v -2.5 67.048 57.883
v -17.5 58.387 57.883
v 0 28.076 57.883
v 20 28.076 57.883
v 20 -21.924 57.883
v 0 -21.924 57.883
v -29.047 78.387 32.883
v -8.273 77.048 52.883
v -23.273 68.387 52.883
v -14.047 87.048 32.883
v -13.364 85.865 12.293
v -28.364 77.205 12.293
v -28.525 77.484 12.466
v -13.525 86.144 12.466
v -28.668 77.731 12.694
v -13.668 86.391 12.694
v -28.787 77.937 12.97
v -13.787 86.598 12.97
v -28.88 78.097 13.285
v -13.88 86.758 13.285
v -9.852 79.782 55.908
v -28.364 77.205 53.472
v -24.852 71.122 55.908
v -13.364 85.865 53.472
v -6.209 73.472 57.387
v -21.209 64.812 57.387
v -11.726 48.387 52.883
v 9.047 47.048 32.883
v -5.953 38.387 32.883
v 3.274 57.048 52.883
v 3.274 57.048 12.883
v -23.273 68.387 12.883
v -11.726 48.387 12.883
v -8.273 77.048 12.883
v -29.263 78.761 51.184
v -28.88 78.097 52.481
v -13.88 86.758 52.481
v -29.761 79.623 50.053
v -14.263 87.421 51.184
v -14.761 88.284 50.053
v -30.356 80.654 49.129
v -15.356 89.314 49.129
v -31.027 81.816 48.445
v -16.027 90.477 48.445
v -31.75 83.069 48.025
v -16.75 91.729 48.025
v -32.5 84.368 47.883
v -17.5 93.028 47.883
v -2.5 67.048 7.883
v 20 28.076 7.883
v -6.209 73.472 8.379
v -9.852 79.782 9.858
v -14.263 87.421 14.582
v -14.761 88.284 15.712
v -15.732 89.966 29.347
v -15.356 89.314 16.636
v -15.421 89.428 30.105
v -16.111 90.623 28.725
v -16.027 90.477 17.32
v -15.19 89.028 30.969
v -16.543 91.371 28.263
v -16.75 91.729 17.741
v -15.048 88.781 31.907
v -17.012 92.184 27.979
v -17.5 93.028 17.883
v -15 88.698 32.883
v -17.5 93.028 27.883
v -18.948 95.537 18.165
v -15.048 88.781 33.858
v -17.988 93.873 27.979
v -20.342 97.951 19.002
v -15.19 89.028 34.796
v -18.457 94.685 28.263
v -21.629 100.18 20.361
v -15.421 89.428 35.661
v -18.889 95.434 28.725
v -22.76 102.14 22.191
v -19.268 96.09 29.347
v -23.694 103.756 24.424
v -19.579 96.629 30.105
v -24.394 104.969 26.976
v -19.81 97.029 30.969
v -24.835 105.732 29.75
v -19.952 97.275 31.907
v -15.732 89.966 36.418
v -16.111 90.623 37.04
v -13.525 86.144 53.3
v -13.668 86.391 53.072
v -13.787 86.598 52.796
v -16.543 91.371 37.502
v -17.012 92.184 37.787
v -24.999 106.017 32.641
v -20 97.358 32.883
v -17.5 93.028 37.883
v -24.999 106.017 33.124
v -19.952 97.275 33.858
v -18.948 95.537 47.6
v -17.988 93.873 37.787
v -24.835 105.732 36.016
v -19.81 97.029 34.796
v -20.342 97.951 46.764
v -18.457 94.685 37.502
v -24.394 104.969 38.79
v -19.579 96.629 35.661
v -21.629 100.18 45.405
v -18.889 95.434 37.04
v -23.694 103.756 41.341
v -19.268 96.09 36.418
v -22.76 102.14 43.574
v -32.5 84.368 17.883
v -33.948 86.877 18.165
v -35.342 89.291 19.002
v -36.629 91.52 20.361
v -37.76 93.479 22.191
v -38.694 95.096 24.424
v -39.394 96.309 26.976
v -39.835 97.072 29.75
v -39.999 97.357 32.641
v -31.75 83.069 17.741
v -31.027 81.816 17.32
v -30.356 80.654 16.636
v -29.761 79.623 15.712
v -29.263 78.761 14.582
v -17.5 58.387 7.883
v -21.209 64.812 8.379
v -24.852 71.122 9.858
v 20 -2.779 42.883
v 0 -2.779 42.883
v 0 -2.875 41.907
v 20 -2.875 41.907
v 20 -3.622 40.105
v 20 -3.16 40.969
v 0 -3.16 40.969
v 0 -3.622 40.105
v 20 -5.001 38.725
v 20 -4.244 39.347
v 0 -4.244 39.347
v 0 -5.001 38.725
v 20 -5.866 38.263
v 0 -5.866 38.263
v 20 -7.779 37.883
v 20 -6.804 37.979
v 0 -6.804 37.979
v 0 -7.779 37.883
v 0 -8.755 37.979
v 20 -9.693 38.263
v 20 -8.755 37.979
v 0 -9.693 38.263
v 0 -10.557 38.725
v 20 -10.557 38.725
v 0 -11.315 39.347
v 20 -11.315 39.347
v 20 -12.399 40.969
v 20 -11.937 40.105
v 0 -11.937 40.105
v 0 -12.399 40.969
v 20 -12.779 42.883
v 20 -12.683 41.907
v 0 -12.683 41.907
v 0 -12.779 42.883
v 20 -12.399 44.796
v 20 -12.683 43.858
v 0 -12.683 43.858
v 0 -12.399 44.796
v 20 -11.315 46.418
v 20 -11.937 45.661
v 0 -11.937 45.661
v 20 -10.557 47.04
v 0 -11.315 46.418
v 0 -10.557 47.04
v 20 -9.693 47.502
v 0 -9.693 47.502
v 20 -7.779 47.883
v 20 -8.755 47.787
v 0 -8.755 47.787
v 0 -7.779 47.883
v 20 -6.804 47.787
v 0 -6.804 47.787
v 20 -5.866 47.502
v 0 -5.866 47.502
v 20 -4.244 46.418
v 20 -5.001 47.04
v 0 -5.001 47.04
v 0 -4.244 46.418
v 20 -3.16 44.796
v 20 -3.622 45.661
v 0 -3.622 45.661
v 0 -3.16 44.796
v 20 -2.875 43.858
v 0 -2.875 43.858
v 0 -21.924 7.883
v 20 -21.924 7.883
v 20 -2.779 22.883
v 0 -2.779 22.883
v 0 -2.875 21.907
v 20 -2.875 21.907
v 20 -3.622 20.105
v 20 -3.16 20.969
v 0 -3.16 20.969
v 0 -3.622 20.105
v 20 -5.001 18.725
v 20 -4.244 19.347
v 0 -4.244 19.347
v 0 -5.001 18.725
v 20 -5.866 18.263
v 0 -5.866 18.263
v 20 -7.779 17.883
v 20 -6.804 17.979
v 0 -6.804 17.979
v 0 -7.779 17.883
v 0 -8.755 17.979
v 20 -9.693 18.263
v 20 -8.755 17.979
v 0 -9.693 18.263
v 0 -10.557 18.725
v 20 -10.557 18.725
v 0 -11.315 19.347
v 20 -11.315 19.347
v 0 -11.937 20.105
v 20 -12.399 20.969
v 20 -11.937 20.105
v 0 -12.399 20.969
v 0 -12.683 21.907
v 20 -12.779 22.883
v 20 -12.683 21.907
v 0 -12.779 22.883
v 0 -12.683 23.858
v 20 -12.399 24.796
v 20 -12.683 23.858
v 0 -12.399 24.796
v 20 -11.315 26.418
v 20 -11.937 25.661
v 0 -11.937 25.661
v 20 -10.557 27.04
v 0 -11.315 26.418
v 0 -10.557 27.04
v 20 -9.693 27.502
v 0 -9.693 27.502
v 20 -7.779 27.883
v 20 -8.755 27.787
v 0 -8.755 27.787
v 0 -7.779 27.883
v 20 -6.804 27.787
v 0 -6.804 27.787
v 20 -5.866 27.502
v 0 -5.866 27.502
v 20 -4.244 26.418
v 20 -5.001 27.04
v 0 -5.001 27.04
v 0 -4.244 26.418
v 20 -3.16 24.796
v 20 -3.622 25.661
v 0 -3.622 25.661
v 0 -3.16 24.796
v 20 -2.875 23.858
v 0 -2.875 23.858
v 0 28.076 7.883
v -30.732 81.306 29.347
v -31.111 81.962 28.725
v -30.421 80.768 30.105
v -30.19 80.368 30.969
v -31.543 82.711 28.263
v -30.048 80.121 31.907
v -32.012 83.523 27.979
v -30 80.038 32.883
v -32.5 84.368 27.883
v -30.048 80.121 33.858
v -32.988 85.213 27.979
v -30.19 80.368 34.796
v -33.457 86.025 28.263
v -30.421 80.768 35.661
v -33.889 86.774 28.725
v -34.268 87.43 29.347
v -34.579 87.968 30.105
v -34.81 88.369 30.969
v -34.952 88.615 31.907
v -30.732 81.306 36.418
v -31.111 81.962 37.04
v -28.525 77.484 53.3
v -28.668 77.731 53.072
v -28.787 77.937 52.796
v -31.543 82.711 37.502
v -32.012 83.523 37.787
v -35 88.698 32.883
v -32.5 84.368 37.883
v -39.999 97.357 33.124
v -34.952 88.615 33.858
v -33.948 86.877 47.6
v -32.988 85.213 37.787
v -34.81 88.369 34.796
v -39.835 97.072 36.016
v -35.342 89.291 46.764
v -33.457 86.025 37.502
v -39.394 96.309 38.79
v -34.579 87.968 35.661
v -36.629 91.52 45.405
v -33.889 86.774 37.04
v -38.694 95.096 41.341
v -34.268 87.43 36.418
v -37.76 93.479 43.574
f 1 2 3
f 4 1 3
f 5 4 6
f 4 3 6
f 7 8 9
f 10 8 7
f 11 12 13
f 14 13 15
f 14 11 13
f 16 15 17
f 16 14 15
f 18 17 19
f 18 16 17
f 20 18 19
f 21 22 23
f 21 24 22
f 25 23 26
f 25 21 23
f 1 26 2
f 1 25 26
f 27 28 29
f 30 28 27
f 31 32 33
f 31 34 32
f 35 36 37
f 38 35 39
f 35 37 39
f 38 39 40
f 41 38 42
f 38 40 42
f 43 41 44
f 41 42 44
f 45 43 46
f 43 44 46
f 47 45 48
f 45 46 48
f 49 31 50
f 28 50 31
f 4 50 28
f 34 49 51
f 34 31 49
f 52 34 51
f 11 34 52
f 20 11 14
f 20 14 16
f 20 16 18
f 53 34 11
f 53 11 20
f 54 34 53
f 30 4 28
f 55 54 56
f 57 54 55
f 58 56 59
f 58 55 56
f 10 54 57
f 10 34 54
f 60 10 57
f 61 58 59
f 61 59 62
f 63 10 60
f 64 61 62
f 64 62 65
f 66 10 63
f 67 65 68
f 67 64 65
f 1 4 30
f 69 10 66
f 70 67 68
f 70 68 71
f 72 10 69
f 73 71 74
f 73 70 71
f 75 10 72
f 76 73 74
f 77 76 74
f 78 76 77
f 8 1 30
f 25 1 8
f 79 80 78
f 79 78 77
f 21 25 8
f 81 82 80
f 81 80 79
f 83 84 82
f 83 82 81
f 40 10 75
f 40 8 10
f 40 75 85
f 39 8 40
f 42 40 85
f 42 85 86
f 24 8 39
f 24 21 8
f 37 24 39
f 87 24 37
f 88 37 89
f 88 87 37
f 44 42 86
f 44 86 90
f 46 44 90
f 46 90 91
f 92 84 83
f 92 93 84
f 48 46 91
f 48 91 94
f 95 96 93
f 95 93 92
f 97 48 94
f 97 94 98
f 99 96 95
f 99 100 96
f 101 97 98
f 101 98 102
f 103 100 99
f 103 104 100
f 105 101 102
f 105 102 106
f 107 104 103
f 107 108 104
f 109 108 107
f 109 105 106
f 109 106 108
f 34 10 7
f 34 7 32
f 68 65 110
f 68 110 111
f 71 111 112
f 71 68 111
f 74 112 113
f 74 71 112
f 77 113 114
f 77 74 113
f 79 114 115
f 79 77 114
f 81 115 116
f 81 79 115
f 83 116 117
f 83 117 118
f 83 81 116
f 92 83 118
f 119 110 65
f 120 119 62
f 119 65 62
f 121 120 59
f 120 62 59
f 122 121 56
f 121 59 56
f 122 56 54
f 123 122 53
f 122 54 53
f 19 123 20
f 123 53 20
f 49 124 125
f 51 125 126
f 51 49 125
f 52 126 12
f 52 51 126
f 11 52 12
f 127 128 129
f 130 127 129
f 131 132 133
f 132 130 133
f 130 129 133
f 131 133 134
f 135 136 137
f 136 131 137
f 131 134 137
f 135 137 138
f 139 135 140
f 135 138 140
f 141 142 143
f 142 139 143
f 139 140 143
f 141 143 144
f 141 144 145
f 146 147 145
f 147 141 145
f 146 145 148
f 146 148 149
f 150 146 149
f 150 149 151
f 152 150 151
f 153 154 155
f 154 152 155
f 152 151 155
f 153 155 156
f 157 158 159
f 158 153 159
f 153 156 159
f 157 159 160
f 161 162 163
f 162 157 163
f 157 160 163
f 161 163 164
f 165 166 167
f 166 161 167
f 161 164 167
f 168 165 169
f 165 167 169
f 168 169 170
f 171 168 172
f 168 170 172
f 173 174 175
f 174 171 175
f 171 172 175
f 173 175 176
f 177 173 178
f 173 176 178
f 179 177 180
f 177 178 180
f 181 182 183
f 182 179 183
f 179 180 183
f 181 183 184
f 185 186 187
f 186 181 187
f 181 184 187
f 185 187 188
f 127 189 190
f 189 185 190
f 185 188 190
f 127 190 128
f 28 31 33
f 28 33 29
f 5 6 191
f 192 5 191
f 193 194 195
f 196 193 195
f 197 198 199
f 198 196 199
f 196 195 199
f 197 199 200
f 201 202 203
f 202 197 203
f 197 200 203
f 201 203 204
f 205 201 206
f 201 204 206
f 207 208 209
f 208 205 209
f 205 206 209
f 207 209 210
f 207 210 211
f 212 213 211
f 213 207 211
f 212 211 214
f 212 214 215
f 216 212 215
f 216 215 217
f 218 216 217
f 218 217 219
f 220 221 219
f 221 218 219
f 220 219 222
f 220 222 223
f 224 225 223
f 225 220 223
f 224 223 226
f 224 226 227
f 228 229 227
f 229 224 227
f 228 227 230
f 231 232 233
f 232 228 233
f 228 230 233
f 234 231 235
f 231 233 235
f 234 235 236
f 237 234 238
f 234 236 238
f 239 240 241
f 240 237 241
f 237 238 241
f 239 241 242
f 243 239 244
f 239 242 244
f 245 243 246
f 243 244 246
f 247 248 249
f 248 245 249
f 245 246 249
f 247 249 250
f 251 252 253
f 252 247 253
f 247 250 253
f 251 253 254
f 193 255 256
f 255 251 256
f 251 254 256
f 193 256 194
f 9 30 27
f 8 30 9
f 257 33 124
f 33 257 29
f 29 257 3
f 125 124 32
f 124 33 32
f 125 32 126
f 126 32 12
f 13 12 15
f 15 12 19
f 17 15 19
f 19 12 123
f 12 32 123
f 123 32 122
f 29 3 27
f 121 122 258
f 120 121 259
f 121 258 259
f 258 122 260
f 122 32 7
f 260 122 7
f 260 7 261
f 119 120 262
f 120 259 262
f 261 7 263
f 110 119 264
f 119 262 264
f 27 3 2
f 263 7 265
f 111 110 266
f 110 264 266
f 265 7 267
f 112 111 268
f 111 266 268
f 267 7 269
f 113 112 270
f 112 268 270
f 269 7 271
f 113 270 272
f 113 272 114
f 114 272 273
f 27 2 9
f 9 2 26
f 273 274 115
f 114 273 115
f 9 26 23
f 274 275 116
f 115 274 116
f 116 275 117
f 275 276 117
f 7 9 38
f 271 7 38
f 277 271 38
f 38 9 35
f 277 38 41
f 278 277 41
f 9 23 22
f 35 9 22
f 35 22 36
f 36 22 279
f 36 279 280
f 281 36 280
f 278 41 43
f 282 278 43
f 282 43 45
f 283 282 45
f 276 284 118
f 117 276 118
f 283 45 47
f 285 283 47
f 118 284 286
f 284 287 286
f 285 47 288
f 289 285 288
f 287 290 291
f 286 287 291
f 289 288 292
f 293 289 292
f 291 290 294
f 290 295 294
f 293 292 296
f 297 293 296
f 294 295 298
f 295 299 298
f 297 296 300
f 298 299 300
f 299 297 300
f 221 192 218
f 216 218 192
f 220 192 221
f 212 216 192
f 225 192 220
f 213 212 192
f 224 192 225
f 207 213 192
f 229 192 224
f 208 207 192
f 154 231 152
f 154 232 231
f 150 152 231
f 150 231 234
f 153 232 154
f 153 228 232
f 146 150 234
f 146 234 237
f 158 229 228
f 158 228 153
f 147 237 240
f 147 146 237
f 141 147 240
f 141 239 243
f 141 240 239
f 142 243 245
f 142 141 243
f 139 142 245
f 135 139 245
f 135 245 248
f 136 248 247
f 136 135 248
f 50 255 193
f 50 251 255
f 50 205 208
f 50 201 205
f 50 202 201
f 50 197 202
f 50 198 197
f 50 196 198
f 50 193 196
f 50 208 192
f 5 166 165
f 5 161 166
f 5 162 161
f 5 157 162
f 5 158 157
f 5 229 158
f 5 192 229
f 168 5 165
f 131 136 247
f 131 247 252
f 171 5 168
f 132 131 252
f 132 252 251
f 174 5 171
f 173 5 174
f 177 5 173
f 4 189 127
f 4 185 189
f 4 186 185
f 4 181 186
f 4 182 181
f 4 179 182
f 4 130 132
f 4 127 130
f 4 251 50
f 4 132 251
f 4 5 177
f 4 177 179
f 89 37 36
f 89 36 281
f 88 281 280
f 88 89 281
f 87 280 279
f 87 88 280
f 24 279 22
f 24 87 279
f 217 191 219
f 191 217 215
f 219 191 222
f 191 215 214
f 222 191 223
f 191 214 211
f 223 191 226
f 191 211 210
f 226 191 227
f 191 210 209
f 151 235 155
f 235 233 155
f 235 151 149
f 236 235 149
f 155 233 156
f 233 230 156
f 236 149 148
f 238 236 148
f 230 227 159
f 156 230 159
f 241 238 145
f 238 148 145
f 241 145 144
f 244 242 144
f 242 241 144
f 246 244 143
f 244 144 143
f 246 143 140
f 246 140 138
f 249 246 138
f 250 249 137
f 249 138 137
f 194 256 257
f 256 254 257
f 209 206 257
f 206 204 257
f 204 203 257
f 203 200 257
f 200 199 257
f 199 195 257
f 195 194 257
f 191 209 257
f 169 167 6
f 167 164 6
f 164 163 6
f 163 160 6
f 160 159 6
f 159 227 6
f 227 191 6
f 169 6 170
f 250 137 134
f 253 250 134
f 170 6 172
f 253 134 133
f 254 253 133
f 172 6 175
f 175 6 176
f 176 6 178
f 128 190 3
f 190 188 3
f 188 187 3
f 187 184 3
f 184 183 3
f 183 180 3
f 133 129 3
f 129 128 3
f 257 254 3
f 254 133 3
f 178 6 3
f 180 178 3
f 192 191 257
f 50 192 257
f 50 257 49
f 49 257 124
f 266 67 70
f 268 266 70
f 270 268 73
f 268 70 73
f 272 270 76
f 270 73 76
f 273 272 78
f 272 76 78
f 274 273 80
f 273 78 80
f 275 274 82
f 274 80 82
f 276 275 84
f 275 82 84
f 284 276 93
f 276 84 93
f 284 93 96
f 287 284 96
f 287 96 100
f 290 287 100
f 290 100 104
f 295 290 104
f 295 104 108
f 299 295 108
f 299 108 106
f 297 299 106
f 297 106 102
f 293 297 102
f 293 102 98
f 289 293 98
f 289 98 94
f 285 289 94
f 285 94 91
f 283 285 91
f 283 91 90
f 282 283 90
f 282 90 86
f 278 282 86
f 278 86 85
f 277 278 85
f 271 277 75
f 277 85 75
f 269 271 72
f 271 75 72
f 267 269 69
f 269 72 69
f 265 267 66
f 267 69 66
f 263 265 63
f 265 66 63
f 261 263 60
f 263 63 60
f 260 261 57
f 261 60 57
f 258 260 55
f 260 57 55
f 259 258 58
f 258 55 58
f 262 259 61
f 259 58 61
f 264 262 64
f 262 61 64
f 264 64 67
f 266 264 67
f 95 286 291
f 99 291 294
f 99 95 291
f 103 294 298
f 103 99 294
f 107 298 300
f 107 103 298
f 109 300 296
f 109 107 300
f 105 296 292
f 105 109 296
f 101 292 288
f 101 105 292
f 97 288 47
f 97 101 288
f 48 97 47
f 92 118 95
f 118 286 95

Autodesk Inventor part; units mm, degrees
ref_plane "YZ Plane" through (0, 0, 0) normal (1, 0, 0) x (0, 1, 0)
ref_plane "XZ Plane" through (0, 0, 0) normal (0, 1, 0) x (-1, 0, 0)
ref_plane "XY Plane" through (0, 0, 0) normal (0, 0, 1) x (1, 0, 0)
sketch "Sketch1" plane through (0, 0, 0) normal (1, 0, 0) x (0, 1, 0)
  line L0 (28.0764, 57.8828) -> (-21.9236, 57.8828)
  line L1 (-21.9236, 57.8828) -> (-21.9236, 7.8828)
  line L2 (-21.9236, 7.8828) -> (28.0764, 7.8828)
  line L3 (28.0764, 7.8828) -> (28.0764, 57.8828)
  circle A0 centre (-7.7792, 22.8828) radius 5
  circle A1 centre (-7.7792, 42.8828) radius 5
  point P0 (0, 0)
  dimension "d0" = 50
  dimension "d1" = 50
  dimension "d3" = 10
  dimension "d5" = 10
extrude "Extrusion1" add sketch "Sketch1" along normal blind 20
sketch "Sketch2" plane through (0, -21.9236, 57.8828) normal (0, 0, 1) x (1, 0, 0)
  line L0 (20, 0) -> (20, 50) projected
  line L1 (20, 50) -> (-25, 127.9423)
  line L2 (20, 50) -> (110, 50) construction
  line L3 (0, 50) -> (-45, 127.9423)
  line L4 (0, 50) -> (90, 50) construction
  line L5 (-45, 127.9423) -> (-25, 127.9423)
  line L6 (0, 50) -> (20, 50)
  point P0 (0, 21.9236)
  dimension "d8" = 90
  dimension "d9" = 120
  dimension "d10" = 90
  dimension "d11" = 120
extrude "Extrusion2" add sketch "Sketch2" against normal blind 50
sketch "Sketch3" plane through (20, 28.0764, 57.8828) normal (0.866, 0.5, 0) x (0, 0, -1)
  line L0 (0, 0) -> (0, -43.3013) projected
  line L1 (0, 0) -> (0, 90) projected
  arc A0 (40, 75) -> (10, 75) centre (25, 75) ccw
  line L2 (0, 0) -> (0, 45)
  line L3 (50, 0) -> (0, 0) projected
  line L4 (0, 0) -> (50, 0)
  line L5 (50, 0) -> (50, 45)
  arc A1 (5.4018, 67.7593) -> (10, 75) centre (2, 75) ccw
  line L6 (10, 75) -> (2, 75) construction
  line L7 (4.7362, 67.4825) -> (2, 75) construction
  arc A2 (40, 75) -> (44.5982, 67.7593) centre (48, 75) ccw
  line L8 (40, 75) -> (48, 75) construction
  line L9 (45.2638, 67.4825) -> (48, 75) construction
  arc A3 (4.4105, 66.7289) -> (0, 45) centre (55.73, 45) ccw
  arc A4 (50, 45) -> (45.5895, 66.7289) centre (-5.73, 45) ccw
  arc A5 (5.4018, 67.7593) -> (4.4105, 66.7289) centre (6.2523, 65.9491) ccw
  arc A6 (45.5895, 66.7289) -> (44.5982, 67.7593) centre (43.7477, 65.9491) ccw
  line L10 (25, 90) -> (0, 90)
  line L11 (0, 90) -> (0, 45)
  line L12 (50, 90) -> (50, 0) projected
  line L13 (50, 90) -> (50, 45)
  line L14 (25, 90) -> (50, 90)
  point P0 (57.8828, -14.3149)
  dimension "d18" = 45
  dimension "d19" = 45
  dimension "d20" = 8
  dimension "d21" = 70
  dimension "d22" = 8
  dimension "d23" = 70
  dimension "d24" = 2
  dimension "d25" = 2
extrude "Extrusion3" cut sketch "Sketch3" against normal blind 50 contours L1 L10 A0 A1 A5 A3 | A4 A6 A2 A0 L14 L12
sketch "Sketch4" plane through (-40, 97.3585, 32.8828) normal (0.5, -0.866, 0) x (0.866, 0.5, 0)
  line L0 (17.3205, 25) -> (17.3205, 0) projected
  line L1 (17.3205, 0) -> (17.3205, -25) projected
  line L2 (17.3205, 25) -> (17.3205, -25)
  line L3 (17.3205, -25) -> (-0.3461, -25)
  line L4 (-0.3461, -25) -> (-0.3461, 25)
  line L5 (17.3205, 25) -> (0, 25) projected
  line L6 (-0.3461, 25) -> (17.3205, 25)
  point P0 (-14.0382, -32.8828)
  point P1 (0, 25)
extrude "Extrusion4" cut sketch "Sketch4" against normal blind 50
sketch "Sketch5" plane through (20, 28.0764, 57.8828) normal (0.866, 0.5, 0) x (0, 0, -1)
  line L0 (50, 0) -> (0, 0) projected
  circle A0 centre (25, 75) radius 5
  point P0 (57.8828, -14.3149)
  dimension "d32" = 10
extrude "Extrusion5" cut sketch "Sketch5" against normal blind 50
sketch "Sketch6" plane through (20, 28.0764, 57.8828) normal (0.866, 0.5, 0) x (0, 0, -1)
  line L0 (0, 0) -> (0, 45) projected
  line L1 (50, 0) -> (0, 0) projected
  line L2 (25, 68.094) -> (45, 56.547)
  line L3 (45, 56.547) -> (45, 33.453)
  line L4 (45, 33.453) -> (25, 21.906)
  line L5 (25, 21.906) -> (5, 33.453)
  line L6 (5, 33.453) -> (5, 56.547)
  line L7 (5, 56.547) -> (25, 68.094)
  point P0 (57.8828, -14.3149)
  point P1 (25, 45)
  point P2 (45, 45)
  point P3 (5, 45)
  dimension "d37" = 40
extrude "Extrusion6" cut sketch "Sketch6" against normal blind 30
properties part number "6 - Part  5"
